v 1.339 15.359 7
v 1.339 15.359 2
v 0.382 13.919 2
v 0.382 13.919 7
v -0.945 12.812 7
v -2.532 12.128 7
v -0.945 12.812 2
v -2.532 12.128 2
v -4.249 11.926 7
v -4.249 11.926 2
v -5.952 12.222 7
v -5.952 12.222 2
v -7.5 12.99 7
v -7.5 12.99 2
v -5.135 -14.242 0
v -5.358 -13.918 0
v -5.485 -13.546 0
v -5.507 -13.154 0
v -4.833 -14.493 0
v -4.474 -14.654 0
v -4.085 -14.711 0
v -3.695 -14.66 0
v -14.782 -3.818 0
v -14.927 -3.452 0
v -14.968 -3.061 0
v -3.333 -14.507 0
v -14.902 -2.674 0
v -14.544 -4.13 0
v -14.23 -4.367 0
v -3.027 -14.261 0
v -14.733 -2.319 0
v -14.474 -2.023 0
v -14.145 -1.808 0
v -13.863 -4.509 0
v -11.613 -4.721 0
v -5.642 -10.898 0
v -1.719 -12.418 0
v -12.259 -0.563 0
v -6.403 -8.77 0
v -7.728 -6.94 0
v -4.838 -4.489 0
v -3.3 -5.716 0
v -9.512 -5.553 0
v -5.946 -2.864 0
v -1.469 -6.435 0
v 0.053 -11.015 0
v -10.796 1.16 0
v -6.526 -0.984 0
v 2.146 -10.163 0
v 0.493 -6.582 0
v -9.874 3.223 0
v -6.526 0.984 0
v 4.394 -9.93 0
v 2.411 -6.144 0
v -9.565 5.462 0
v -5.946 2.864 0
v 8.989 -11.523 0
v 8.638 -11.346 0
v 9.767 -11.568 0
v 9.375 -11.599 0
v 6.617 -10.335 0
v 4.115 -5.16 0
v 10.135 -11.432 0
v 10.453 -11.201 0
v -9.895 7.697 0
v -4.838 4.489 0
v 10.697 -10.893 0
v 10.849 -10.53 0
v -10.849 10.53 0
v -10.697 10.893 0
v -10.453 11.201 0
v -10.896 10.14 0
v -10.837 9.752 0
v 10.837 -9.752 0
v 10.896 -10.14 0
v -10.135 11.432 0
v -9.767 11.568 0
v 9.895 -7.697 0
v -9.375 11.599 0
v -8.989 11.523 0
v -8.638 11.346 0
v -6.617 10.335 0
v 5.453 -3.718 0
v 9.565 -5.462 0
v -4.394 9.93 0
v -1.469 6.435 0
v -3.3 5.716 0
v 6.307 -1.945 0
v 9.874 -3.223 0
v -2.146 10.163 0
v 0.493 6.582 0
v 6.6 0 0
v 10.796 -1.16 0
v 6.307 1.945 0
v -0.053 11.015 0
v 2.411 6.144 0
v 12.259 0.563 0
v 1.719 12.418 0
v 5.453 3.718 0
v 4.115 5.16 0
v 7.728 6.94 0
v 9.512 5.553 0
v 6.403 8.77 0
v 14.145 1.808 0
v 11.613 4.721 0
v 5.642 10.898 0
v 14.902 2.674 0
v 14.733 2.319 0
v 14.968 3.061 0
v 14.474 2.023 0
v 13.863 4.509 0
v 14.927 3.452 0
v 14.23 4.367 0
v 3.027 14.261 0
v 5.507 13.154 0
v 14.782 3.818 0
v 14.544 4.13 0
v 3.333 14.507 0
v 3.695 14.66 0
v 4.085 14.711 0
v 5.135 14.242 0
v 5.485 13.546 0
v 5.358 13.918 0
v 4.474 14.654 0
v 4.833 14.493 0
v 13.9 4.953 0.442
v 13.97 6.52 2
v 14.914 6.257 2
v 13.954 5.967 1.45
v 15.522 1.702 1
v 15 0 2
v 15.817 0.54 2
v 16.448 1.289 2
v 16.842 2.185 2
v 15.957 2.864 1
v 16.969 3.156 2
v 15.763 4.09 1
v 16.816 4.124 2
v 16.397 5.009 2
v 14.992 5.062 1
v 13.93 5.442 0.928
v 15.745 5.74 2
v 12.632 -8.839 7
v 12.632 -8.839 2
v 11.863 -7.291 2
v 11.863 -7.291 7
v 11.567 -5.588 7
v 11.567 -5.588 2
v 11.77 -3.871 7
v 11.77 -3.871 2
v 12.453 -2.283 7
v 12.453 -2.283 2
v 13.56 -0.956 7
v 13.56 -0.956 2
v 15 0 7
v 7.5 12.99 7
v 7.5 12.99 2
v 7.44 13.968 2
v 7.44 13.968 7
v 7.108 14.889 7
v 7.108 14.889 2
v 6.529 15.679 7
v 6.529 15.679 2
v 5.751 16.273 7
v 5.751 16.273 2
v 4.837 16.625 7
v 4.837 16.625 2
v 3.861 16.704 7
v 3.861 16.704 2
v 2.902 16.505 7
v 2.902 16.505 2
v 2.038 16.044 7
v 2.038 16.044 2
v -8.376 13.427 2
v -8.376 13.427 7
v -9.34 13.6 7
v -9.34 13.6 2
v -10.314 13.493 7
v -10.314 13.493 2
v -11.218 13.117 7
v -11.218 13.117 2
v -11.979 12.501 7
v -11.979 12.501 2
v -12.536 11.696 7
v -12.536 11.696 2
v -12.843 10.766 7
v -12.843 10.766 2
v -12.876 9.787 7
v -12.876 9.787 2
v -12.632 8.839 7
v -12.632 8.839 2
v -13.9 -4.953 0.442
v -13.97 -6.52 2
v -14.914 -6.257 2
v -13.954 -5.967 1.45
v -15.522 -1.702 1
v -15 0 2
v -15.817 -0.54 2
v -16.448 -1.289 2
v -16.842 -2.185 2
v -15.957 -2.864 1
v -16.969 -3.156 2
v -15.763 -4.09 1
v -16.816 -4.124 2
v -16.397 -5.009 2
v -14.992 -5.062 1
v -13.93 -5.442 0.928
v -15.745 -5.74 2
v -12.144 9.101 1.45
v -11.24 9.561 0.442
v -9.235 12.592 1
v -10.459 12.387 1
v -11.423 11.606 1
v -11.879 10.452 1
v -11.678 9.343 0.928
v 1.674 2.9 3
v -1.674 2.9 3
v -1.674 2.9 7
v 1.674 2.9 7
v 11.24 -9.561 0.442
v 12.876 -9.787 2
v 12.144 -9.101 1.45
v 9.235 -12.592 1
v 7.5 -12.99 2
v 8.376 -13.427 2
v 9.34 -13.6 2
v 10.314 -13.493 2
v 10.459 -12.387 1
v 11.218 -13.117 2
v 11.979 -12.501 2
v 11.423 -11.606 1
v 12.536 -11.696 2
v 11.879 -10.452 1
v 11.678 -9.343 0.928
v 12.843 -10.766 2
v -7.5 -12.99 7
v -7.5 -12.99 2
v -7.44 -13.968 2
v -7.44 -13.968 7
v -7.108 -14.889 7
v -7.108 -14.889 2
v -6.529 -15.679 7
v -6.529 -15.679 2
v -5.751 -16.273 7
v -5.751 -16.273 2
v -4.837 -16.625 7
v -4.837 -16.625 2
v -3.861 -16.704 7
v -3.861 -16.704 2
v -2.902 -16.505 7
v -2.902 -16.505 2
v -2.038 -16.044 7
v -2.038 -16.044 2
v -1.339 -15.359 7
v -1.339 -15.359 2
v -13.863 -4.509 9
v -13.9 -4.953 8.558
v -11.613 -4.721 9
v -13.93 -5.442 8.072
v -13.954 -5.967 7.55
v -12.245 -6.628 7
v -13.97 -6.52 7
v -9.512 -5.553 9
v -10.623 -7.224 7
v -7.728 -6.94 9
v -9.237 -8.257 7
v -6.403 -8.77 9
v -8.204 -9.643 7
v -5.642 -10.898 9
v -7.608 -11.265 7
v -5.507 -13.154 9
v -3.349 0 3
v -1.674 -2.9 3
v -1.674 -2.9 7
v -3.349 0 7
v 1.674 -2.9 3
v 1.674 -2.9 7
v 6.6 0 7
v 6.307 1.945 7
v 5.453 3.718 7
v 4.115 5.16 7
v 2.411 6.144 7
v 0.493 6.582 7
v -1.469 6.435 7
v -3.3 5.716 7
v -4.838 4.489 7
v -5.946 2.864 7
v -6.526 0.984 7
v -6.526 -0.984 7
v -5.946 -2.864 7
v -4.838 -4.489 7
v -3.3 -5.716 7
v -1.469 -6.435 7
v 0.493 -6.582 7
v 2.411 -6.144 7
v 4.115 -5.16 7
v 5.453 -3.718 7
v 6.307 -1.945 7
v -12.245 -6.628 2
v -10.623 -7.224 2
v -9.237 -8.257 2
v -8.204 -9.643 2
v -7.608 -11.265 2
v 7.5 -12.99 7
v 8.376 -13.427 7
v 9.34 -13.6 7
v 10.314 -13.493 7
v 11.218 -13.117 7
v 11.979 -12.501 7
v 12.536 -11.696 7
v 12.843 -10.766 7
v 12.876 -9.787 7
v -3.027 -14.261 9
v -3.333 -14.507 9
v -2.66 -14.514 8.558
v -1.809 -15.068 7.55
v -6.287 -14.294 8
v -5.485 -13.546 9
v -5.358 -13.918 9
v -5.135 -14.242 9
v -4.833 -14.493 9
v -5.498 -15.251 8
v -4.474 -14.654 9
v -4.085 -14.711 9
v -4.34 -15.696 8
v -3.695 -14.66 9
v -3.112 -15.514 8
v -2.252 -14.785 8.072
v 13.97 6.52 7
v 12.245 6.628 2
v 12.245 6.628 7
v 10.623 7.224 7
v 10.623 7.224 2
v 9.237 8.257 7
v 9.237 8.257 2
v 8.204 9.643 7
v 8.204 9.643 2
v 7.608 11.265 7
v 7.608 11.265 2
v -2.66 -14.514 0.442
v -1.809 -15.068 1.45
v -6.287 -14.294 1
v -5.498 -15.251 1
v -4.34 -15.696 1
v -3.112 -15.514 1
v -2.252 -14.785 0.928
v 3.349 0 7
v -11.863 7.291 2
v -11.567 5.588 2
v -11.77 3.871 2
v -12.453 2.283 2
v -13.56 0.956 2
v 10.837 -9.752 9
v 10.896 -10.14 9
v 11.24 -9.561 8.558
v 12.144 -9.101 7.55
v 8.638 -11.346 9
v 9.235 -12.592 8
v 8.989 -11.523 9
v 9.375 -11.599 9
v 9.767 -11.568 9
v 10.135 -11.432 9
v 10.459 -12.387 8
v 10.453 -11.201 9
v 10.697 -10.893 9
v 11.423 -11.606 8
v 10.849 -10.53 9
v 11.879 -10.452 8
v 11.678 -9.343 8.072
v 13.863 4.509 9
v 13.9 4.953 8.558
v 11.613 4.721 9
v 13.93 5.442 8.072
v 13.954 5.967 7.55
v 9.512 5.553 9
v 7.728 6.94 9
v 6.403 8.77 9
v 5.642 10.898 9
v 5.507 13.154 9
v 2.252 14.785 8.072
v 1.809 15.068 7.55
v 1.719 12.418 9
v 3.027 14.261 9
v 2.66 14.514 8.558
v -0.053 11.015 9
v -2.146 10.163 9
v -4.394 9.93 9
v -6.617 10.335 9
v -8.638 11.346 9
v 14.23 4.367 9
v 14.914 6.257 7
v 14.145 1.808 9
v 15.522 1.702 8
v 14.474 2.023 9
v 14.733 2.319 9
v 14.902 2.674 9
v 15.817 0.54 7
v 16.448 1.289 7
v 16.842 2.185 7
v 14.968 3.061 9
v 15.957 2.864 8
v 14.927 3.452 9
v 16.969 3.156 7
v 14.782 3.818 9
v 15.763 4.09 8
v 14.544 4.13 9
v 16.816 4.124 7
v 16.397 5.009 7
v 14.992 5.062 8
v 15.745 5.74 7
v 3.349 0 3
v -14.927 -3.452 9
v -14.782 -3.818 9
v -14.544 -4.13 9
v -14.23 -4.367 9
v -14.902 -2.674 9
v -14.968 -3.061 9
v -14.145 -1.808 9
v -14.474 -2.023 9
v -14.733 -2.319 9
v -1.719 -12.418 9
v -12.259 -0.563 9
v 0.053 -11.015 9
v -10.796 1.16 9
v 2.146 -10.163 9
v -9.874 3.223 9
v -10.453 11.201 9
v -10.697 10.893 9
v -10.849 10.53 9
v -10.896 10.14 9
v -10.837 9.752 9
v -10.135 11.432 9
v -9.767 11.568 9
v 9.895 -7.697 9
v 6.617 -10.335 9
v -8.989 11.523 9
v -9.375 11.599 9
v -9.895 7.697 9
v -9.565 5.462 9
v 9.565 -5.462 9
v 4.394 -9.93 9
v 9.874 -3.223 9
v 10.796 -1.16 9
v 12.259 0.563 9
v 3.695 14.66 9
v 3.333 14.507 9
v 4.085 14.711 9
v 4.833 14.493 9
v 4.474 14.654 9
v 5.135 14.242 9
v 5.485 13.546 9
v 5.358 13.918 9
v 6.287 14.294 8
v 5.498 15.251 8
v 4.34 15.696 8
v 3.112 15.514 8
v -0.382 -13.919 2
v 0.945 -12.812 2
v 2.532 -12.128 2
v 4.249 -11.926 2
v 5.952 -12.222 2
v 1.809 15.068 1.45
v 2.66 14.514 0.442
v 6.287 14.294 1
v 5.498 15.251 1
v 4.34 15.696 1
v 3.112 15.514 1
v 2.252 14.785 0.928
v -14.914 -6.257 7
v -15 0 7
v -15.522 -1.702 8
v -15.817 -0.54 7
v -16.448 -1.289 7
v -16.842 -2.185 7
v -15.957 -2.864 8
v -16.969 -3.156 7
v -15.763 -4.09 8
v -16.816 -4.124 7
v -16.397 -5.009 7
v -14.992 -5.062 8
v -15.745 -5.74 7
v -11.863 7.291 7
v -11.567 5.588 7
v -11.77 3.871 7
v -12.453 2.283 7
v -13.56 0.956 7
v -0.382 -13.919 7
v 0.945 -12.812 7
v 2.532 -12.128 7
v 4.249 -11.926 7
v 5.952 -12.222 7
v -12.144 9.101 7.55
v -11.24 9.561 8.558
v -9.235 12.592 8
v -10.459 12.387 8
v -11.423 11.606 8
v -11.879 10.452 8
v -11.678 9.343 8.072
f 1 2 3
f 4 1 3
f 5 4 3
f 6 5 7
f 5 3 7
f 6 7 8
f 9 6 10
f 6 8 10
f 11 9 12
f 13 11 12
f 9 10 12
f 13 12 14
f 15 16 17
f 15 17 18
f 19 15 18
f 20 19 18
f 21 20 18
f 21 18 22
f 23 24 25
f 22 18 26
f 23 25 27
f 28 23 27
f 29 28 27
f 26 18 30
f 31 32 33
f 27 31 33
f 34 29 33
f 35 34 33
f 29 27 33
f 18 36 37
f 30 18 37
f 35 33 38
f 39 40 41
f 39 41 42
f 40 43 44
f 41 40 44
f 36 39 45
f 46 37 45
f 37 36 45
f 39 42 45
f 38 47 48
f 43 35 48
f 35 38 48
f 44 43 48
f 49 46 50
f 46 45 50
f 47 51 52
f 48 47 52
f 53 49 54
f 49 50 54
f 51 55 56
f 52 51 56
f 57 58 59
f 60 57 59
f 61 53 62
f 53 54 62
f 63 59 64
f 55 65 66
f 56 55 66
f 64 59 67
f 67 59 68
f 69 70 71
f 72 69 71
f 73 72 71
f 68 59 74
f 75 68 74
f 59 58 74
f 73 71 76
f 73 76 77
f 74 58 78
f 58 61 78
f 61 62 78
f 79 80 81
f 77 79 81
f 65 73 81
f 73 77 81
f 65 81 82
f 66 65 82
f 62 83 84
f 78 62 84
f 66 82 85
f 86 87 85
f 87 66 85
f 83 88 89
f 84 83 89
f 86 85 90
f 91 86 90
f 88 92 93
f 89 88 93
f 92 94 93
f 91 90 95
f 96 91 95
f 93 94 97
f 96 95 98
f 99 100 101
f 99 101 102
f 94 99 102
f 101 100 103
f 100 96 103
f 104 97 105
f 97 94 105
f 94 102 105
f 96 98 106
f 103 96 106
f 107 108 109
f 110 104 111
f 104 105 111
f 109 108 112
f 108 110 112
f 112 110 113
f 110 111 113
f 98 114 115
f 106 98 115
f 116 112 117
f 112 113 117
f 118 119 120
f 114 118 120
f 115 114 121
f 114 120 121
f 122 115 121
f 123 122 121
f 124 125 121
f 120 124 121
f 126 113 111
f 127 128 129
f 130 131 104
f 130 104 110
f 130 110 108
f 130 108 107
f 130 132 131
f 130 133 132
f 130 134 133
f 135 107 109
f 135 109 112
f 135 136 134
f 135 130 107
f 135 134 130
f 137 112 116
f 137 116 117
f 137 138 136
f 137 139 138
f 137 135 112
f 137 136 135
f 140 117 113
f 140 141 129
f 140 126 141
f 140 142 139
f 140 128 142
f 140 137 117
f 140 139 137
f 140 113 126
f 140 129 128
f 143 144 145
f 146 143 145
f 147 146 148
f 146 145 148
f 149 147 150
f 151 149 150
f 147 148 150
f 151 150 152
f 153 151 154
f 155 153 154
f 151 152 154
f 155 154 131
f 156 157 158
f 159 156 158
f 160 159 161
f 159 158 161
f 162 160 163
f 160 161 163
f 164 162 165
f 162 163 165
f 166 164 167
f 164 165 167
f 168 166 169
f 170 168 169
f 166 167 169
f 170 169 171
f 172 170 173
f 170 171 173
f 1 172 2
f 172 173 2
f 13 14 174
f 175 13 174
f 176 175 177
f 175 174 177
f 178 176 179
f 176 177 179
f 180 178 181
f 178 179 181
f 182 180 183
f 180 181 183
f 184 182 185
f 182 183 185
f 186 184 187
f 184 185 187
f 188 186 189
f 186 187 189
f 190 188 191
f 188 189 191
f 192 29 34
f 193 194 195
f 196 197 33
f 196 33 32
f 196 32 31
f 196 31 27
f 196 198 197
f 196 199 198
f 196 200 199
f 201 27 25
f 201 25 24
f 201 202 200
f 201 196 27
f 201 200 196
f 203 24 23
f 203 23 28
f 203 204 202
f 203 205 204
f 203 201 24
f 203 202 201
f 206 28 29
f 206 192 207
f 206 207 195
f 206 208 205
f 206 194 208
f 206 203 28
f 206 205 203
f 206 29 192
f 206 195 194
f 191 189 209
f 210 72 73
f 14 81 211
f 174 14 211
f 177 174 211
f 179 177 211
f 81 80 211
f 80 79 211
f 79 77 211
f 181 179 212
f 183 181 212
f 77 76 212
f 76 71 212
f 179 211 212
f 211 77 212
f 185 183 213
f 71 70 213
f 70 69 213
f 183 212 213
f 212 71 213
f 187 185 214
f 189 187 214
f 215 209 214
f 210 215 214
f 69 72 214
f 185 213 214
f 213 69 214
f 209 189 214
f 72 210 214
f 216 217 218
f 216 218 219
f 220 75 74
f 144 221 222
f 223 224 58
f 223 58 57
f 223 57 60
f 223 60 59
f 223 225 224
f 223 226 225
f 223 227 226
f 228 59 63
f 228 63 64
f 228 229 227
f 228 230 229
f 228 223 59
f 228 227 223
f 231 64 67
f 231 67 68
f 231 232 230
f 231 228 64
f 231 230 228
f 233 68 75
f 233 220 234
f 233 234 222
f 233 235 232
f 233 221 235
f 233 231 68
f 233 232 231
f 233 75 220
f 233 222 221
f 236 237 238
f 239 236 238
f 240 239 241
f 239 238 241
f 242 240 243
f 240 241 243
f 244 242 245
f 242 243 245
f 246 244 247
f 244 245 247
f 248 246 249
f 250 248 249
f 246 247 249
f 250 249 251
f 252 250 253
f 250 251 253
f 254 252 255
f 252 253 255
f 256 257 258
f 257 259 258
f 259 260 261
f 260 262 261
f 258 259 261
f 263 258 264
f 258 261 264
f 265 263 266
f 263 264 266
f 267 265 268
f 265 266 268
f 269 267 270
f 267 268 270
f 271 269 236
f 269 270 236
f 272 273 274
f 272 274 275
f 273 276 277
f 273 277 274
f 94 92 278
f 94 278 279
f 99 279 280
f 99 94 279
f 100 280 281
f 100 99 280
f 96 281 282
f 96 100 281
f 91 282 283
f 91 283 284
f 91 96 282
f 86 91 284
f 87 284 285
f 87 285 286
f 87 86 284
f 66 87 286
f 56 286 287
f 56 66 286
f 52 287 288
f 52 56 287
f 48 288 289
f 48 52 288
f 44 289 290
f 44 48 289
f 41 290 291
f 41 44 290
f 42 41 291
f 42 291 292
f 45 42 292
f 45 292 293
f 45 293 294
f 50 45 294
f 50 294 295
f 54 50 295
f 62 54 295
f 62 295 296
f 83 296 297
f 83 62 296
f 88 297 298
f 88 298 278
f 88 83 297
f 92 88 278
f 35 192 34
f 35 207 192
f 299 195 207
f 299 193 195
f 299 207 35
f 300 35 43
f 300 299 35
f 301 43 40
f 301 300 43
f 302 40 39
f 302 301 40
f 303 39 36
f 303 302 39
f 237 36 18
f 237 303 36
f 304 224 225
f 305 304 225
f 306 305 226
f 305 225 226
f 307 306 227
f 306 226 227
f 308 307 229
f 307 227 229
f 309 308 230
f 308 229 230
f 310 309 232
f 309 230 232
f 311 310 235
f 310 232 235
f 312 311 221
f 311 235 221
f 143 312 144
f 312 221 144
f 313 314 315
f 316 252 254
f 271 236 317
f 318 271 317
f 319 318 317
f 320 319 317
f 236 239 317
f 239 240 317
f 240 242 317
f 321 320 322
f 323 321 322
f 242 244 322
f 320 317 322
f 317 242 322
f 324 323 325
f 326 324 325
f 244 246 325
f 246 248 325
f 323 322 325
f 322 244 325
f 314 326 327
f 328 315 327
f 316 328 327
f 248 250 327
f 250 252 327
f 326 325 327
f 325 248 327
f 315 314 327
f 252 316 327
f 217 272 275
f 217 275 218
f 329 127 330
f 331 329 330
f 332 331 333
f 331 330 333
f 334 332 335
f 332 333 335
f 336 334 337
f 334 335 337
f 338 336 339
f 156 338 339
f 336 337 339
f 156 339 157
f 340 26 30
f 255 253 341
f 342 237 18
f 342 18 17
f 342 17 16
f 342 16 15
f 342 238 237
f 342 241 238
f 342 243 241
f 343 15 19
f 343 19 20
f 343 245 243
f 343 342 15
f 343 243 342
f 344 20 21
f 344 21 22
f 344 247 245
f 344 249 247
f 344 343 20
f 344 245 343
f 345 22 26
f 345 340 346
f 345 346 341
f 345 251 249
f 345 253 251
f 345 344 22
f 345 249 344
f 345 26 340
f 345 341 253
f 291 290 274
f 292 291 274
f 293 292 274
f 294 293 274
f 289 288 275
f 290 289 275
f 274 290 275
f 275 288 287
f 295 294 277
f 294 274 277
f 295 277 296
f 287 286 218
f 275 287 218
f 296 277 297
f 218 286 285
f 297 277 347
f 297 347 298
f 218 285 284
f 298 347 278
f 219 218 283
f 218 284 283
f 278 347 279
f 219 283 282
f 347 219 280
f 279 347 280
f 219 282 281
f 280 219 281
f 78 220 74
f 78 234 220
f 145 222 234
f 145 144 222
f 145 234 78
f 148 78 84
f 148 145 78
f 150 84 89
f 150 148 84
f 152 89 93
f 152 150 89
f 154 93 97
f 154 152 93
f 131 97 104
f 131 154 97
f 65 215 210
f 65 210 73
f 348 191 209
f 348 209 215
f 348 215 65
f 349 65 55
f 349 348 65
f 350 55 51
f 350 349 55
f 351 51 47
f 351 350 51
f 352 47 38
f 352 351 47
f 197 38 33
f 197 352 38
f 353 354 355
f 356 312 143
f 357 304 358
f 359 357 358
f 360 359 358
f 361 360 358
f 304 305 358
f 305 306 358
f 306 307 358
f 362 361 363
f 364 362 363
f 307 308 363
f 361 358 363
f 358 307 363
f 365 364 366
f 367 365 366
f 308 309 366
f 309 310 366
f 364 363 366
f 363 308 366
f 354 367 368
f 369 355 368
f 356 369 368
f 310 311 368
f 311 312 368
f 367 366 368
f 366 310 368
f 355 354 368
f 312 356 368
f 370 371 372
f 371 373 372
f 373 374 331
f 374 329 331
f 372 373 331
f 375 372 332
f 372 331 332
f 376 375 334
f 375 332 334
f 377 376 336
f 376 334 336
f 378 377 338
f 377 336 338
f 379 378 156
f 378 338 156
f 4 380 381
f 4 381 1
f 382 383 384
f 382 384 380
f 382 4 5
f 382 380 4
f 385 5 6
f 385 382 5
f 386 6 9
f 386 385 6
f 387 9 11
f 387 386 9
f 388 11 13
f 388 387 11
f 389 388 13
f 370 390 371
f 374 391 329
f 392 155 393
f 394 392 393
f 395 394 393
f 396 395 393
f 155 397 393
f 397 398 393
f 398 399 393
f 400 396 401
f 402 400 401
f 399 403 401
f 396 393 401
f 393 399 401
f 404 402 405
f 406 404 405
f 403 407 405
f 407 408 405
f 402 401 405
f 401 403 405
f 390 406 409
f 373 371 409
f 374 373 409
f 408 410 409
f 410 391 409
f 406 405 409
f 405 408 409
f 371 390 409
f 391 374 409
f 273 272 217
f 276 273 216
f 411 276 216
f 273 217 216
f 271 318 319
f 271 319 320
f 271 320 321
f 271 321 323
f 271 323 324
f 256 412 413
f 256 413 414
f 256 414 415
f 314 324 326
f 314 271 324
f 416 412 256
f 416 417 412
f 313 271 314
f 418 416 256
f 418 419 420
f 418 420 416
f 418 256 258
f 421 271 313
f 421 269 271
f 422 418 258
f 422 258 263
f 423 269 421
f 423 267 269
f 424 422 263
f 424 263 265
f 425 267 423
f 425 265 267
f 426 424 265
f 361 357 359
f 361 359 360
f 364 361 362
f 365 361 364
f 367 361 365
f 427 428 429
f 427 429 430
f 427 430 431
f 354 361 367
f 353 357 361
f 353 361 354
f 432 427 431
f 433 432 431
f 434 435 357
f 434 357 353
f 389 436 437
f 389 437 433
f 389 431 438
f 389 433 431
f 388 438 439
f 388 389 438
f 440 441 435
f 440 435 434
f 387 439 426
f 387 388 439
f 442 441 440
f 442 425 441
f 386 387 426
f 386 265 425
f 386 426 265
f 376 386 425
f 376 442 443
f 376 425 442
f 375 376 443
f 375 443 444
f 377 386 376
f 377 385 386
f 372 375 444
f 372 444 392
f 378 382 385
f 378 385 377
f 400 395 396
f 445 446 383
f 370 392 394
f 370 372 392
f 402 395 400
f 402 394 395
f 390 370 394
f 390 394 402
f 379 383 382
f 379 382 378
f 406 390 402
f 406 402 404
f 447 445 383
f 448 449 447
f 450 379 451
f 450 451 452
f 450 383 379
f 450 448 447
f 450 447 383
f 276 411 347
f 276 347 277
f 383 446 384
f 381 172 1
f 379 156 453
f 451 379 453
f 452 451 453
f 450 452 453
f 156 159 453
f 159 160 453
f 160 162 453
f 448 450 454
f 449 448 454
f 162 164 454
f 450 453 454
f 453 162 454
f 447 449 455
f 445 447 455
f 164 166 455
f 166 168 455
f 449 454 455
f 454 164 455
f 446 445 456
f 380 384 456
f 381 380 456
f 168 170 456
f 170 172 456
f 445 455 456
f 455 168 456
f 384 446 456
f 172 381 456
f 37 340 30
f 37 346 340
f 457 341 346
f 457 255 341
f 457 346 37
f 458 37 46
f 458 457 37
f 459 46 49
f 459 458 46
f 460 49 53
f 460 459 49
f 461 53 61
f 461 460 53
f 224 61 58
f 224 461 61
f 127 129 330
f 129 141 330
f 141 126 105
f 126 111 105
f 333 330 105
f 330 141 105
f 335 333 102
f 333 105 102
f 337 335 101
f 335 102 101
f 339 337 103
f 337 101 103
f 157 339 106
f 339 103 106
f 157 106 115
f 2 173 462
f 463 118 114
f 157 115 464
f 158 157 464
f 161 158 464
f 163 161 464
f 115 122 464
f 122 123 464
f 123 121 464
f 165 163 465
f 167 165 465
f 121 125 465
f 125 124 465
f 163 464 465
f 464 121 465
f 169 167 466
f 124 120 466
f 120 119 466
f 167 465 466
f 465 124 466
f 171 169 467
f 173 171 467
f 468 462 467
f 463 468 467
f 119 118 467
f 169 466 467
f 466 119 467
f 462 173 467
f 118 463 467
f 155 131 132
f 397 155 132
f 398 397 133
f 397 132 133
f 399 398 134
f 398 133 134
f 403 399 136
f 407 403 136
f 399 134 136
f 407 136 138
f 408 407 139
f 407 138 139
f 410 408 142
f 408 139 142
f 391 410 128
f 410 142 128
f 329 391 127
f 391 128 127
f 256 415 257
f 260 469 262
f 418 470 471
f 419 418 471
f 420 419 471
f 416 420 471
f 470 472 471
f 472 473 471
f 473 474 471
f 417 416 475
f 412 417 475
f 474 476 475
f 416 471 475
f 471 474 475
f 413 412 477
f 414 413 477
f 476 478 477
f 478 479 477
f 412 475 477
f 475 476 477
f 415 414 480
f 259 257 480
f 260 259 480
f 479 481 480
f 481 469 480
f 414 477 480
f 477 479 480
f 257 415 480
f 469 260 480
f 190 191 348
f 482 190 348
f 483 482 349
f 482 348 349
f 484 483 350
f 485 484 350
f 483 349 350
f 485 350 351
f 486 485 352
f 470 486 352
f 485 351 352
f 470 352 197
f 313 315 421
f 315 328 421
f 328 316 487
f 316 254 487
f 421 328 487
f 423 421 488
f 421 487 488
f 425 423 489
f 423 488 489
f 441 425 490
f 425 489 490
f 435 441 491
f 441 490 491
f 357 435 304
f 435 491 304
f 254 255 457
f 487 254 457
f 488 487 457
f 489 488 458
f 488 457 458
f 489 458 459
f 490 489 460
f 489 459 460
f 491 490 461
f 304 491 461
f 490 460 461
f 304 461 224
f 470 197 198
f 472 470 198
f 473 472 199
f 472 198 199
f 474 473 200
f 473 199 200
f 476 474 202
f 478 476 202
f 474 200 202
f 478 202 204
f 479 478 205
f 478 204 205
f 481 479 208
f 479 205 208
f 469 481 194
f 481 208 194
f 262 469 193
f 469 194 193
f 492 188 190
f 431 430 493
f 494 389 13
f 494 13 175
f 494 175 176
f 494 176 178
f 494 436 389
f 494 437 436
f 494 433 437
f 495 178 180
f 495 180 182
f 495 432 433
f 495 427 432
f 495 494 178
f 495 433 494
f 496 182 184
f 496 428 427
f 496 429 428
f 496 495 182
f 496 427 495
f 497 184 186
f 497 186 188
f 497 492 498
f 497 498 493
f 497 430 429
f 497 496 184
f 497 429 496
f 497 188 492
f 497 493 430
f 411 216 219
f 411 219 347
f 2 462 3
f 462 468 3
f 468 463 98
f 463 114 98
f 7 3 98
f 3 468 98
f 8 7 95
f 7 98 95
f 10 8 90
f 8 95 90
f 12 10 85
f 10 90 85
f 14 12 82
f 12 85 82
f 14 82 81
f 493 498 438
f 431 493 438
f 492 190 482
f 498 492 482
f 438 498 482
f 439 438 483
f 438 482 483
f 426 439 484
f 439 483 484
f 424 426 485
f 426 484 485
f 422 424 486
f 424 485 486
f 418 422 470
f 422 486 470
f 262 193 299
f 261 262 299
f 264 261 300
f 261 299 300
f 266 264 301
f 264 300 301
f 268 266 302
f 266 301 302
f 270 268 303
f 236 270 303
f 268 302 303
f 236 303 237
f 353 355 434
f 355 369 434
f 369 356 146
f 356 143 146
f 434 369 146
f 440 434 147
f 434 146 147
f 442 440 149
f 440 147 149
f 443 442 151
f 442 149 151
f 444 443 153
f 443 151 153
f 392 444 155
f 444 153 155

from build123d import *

# Parameters (mm, degrees)
F0_R     = 6.6
F1_DEPTH = 9
F2_DEPTH = 7
F3_SIZE  = 2
F4_DEPTH = 3


with BuildPart() as f1:
    # F0 (on Top) → F1 (new body)
    with BuildSketch(Plane.XY):
        with BuildLine():
            ThreePointArc((1.338738724, 15.35871396), (-2.5323518967, 12.1283433891), (-7.5, 12.9903810568))
            ThreePointArc((-7.5, 12.9903810568), (-11.6205194267, 12.8362404515), (-12.6316670968, 8.838738724))
            ThreePointArc((-12.6316670968, 8.838738724), (-11.7696294292, 3.8710906207), (-15, 0))
            ThreePointArc((-15, 0), (-16.9267700334, -3.6455448029), (-13.9704058208, -6.519975236))
            ThreePointArc((-13.9704058208, -6.519975236), (-9.2372775325, -8.2572527684), (-7.5, -12.9903810568))
            ThreePointArc((-7.5, -12.9903810568), (-5.3062506067, -16.4817852544), (-1.338738724, -15.35871396))
            ThreePointArc((-1.338738724, -15.35871396), (2.5323518967, -12.1283433891), (7.5, -12.9903810568))
            ThreePointArc((7.5, -12.9903810568), (11.6205194267, -12.8362404515), (12.6316670968, -8.838738724))
            ThreePointArc((12.6316670968, -8.838738724), (11.7696294292, -3.8710906207), (15, 0))
            ThreePointArc((15, 0), (16.9267700334, 3.6455448029), (13.9704058208, 6.519975236))
            ThreePointArc((13.9704058208, 6.519975236), (9.2372775325, 8.2572527684), (7.5, 12.9903810568))
            ThreePointArc((7.5, 12.9903810568), (5.3062506067, 16.4817852544), (1.338738724, 15.35871396))
        make_face()
        Circle(F0_R, mode=Mode.SUBTRACT)
        Circle(F0_R)
        Polygon((-1.6743157806, -2.9), (-3.3486315613, 0), (-1.6743157806, 2.9), (1.6743157806, 2.9), (3.3486315613, 0), (1.6743157806, -2.9), align=None, mode=Mode.SUBTRACT)
        Polygon((-1.6743157806, 2.9), (-3.3486315613, 0), (-1.6743157806, -2.9), (1.6743157806, -2.9), (3.3486315613, 0), (1.6743157806, 2.9), align=None)
    extrude(amount=F1_DEPTH)

    # F0 (on Top) → F2 (cut)
    with BuildSketch(Plane.XY):
        Circle(F0_R)
        Polygon((-1.6743157806, -2.9), (-3.3486315613, 0), (-1.6743157806, 2.9), (1.6743157806, 2.9), (3.3486315613, 0), (1.6743157806, -2.9), align=None, mode=Mode.SUBTRACT)
    extrude(amount=F2_DEPTH, mode=Mode.SUBTRACT)

    # F3
    f3_edges = [f1.edges().sort_by_distance(p)[0] for p in [
        (-2.532352, 12.128343, 0),
        (5.306251, 16.481785, 0),
        (9.237278, 8.257253, 0),
        (16.92677, 3.645545, 0),
        (11.769629, -3.871091, 0),
        (2.532352, -12.128343, 0),
        (-5.306251, -16.481785, 0),
        (-9.237278, -8.257253, 0),
        (-16.92677, -3.645545, 0),
        (-11.769629, 3.871091, 0),
        (9.237278, 8.257253, 9),
        (5.306251, 16.481785, 9),
        (-2.532352, 12.128343, 9),
        (-11.620519, 12.83624, 9),
        (-11.769629, 3.871091, 9),
        (-16.92677, -3.645545, 9),
        (-9.237278, -8.257253, 9),
        (-5.306251, -16.481785, 9),
        (2.532352, -12.128343, 9),
        (11.620519, -12.83624, 9),
        (11.769629, -3.871091, 9),
        (16.92677, 3.645545, 9),
    ]]
    chamfer(f3_edges, length=F3_SIZE)

    # F0 (on Top) → F4 (cut)
    with BuildSketch(Plane.XY):
        Polygon((-1.6743157806, 2.9), (-3.3486315613, 0), (-1.6743157806, -2.9), (1.6743157806, -2.9), (3.3486315613, 0), (1.6743157806, 2.9), align=None)
    extrude(amount=F4_DEPTH, mode=Mode.SUBTRACT)


solid = f1.part
